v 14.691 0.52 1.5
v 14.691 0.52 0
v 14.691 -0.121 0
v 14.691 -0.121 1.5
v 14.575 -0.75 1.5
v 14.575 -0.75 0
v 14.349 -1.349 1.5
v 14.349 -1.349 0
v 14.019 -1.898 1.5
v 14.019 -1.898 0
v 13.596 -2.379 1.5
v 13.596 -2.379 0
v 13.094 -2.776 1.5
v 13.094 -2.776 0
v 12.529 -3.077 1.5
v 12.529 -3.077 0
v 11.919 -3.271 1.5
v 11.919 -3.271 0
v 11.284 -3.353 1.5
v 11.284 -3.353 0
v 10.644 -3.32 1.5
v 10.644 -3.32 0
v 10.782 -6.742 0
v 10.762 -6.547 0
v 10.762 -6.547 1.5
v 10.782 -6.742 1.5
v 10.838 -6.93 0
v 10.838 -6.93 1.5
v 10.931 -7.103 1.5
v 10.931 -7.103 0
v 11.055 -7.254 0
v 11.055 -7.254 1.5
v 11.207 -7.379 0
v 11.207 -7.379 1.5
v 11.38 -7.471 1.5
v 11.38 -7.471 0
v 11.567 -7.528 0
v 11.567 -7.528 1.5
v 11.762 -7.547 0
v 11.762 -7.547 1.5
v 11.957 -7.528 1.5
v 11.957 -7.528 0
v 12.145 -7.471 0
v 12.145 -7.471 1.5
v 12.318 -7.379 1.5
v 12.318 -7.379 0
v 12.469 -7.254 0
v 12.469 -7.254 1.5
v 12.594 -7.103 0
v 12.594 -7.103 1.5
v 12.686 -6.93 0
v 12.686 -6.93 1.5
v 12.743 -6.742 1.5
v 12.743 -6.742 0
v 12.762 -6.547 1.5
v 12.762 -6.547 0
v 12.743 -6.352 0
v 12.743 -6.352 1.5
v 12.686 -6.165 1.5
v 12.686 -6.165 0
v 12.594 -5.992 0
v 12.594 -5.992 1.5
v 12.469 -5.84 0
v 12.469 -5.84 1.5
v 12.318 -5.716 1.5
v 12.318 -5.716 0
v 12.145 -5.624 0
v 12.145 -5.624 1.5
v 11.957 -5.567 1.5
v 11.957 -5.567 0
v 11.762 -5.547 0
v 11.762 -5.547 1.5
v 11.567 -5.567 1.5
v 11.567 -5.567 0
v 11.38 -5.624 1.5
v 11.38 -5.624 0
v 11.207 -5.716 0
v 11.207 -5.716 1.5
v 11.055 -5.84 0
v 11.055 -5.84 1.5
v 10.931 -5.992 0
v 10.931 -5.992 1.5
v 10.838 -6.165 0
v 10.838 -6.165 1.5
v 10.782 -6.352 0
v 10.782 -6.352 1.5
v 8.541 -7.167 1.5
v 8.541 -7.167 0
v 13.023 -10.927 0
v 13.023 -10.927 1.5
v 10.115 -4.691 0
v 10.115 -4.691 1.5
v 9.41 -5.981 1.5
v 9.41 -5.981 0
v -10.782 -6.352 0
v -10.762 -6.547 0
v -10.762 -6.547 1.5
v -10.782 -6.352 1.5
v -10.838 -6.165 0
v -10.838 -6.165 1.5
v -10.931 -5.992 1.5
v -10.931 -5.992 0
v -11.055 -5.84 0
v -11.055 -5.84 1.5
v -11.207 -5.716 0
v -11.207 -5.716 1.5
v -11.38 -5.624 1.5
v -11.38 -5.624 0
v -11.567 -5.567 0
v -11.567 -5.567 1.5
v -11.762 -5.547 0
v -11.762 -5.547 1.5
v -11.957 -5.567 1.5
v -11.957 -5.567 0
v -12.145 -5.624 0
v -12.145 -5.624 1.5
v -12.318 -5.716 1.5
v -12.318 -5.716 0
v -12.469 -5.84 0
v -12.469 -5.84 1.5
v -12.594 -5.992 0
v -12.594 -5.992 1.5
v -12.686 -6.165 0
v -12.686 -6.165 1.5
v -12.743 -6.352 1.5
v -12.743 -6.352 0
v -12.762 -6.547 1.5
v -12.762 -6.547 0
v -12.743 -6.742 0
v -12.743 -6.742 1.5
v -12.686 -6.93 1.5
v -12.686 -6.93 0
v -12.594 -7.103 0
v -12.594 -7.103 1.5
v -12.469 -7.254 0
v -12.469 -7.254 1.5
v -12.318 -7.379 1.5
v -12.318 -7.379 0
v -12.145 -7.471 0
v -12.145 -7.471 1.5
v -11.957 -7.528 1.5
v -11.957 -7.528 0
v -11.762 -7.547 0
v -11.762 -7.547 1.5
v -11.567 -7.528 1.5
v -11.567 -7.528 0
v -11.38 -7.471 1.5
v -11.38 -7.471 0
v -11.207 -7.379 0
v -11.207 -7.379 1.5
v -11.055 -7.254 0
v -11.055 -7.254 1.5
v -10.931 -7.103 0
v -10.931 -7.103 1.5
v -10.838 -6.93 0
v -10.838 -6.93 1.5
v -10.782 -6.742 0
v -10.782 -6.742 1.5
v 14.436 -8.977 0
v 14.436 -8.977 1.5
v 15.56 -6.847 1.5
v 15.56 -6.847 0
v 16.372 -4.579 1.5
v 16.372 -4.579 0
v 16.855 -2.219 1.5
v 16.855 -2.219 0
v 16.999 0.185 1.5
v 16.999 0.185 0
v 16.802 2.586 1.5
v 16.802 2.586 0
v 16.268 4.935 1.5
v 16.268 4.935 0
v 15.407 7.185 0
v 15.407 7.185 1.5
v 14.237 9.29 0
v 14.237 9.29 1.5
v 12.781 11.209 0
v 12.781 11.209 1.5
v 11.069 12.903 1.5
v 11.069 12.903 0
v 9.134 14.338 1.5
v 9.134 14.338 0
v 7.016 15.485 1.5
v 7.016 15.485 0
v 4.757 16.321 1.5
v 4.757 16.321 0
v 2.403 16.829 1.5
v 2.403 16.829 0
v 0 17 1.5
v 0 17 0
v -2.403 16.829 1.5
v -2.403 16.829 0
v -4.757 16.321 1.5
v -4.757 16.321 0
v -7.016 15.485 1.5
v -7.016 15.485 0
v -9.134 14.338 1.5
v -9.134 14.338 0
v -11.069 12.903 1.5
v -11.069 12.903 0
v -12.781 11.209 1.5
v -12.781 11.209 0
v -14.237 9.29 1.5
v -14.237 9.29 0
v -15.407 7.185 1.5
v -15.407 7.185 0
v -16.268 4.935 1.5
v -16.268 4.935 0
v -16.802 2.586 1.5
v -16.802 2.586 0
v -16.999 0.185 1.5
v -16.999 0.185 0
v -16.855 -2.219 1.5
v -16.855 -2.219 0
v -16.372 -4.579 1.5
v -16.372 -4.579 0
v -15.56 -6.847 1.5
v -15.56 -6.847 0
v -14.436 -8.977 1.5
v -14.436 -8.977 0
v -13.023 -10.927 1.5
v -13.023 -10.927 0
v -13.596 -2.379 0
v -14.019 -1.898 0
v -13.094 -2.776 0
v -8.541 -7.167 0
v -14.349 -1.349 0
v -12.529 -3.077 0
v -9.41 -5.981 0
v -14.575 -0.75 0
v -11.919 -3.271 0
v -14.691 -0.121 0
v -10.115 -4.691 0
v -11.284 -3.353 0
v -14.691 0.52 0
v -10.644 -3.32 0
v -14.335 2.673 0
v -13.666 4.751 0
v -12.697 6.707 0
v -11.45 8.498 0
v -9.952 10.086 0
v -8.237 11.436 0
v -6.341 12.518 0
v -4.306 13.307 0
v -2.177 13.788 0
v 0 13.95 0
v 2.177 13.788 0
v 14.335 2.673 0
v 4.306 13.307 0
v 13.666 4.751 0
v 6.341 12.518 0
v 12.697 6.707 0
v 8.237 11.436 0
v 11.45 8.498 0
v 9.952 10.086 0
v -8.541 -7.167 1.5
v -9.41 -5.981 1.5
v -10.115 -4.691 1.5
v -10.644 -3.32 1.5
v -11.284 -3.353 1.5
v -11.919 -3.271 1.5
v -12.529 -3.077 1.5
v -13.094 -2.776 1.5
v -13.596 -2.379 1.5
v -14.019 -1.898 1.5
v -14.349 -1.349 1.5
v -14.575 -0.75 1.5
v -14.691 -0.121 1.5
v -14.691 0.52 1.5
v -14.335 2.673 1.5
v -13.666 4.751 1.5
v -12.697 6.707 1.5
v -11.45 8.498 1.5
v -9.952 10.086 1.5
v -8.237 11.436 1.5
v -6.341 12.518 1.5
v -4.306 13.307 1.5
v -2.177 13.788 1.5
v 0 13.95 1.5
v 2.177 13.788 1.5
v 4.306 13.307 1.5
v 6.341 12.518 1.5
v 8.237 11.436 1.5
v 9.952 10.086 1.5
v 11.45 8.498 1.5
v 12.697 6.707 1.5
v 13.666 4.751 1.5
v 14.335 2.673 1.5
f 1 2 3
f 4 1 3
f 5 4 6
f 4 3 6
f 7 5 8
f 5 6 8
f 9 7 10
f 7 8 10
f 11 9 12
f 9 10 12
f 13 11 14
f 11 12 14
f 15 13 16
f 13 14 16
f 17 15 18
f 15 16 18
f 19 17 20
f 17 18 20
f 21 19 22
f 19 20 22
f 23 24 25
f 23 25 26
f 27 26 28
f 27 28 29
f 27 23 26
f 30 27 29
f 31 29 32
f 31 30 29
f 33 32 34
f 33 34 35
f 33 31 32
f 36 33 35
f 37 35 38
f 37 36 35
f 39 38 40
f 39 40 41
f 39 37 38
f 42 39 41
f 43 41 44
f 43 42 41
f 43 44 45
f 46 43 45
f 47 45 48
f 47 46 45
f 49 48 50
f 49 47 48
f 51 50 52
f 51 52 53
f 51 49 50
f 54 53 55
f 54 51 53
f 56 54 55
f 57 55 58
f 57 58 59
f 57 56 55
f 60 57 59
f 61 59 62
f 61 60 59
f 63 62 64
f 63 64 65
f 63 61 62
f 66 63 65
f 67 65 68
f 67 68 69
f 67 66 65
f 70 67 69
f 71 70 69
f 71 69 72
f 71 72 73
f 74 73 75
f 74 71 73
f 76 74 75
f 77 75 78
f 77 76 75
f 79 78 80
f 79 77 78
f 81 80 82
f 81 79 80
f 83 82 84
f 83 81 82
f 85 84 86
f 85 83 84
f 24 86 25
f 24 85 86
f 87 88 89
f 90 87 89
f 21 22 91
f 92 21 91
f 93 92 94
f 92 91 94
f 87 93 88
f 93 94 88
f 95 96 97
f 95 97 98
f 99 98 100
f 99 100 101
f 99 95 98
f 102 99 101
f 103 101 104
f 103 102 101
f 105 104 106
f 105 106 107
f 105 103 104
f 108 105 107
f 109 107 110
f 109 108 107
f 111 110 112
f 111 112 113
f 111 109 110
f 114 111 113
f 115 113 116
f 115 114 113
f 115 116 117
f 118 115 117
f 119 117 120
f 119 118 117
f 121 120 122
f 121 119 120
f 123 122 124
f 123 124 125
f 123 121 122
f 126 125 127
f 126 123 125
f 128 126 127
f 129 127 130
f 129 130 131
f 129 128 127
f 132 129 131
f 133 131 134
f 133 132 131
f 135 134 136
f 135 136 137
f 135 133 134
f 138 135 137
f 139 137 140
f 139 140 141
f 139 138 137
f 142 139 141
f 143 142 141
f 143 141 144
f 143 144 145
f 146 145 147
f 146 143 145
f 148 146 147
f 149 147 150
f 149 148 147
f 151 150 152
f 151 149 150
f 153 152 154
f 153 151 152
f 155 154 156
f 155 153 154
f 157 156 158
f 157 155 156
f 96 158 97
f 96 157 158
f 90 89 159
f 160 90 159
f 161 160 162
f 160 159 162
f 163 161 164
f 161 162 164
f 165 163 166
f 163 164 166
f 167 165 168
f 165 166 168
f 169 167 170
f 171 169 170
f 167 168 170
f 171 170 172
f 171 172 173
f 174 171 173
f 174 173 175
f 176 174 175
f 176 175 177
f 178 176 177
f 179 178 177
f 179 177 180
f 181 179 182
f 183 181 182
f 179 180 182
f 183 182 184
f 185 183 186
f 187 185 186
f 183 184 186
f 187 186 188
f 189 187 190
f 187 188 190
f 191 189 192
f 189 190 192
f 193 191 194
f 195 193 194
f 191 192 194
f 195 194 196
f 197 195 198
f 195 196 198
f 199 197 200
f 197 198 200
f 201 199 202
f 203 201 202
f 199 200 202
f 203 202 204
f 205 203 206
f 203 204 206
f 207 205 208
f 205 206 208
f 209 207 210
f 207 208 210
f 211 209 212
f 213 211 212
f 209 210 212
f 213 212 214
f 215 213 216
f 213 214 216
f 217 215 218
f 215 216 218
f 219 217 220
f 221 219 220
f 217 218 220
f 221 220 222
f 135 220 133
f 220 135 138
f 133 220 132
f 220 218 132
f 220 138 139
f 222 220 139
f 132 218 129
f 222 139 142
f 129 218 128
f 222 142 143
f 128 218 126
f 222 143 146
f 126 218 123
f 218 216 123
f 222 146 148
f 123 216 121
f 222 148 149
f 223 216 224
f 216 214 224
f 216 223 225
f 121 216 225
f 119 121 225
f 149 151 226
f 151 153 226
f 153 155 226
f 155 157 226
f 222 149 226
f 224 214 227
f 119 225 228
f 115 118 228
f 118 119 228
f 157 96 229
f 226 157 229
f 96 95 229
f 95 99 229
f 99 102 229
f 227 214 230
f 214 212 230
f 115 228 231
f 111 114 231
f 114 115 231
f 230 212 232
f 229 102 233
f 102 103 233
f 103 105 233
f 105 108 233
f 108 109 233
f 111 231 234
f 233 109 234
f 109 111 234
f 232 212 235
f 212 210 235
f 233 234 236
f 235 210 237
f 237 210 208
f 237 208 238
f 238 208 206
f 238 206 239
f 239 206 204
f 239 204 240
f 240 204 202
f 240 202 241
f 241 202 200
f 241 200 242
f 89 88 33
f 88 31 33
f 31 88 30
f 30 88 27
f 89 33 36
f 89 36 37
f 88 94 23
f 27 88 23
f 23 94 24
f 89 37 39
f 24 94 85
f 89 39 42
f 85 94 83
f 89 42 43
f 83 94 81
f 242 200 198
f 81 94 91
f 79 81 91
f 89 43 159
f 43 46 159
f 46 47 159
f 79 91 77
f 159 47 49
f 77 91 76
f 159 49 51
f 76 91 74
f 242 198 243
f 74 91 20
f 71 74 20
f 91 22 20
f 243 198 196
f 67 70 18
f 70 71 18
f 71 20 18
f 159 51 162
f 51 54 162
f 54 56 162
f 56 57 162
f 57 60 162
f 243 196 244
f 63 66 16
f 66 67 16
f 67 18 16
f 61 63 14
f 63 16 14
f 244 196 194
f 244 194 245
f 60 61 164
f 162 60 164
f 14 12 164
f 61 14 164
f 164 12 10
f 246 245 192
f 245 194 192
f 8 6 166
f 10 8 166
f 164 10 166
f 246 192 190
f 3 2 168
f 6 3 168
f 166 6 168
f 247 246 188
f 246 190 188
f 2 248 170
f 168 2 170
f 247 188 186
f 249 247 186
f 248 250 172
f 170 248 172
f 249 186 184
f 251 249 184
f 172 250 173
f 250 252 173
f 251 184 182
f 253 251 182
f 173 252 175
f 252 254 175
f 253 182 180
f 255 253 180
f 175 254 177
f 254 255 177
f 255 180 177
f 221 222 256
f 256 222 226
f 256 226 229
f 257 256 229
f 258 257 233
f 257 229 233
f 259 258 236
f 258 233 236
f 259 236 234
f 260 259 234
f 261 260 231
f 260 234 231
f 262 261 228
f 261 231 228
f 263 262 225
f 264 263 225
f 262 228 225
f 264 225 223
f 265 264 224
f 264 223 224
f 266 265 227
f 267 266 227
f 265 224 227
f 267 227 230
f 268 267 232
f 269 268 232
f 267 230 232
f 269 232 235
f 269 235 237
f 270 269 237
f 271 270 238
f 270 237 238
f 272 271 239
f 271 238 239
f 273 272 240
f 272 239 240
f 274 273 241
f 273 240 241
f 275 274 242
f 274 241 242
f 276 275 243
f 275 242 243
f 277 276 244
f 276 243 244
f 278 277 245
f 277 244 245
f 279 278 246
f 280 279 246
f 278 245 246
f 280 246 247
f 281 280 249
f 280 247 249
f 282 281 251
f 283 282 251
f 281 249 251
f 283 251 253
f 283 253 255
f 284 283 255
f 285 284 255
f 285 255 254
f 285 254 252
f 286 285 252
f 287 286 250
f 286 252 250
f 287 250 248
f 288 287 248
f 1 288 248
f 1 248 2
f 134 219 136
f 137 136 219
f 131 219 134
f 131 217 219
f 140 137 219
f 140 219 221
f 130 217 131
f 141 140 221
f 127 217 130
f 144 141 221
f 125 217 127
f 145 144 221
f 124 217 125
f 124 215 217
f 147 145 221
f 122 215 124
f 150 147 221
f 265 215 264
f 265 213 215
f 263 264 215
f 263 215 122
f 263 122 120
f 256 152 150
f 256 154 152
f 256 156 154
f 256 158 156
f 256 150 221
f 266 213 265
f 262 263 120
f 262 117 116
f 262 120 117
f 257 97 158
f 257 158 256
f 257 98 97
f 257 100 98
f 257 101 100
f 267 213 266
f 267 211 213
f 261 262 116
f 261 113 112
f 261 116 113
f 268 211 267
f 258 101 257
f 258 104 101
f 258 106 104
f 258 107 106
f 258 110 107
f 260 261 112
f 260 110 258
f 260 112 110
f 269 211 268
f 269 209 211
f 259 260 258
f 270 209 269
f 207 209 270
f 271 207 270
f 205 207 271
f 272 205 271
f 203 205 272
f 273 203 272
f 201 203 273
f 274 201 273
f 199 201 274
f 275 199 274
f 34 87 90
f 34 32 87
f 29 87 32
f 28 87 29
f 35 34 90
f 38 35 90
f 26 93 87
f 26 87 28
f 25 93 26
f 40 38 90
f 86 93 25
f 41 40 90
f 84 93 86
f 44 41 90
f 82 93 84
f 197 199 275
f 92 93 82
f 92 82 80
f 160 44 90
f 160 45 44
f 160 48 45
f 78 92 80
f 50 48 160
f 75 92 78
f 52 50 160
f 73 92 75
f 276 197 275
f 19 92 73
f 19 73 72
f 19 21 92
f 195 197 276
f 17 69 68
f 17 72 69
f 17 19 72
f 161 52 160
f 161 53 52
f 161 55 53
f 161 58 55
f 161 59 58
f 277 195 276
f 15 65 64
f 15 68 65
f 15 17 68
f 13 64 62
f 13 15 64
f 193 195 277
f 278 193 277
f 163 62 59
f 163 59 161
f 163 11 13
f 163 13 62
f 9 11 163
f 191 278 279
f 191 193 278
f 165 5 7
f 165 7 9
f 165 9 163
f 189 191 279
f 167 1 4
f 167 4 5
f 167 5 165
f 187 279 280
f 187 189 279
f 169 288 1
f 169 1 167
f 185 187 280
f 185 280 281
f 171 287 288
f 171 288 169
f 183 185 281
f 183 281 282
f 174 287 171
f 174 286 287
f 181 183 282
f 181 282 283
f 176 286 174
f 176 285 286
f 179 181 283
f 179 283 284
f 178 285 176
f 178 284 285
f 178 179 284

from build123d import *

# Parameters (mm, degrees)
SKETCH1_R           = 1
BOSS_EXTRUDE1_DEPTH = 1.5


with BuildPart() as part:
    # Sketch1 → Boss-Extrude1 (new body)
    with BuildSketch(Plane.XY):
        with BuildLine():
            Line((-13.022755533, -10.927389365), (-8.541395541, -7.167081848))
            ThreePointArc((-8.541395541, -7.167081848), (-9.783859128, -5.347765941), (-10.644354895, -3.319669993))
            ThreePointArc((-10.644354895, -3.319669993), (-13.596382147, -2.37892663), (-14.690850544, 0.51962506))
            ThreePointArc((-14.690850544, 0.51962506), (0, 13.95), (14.690850544, 0.51962506))
            ThreePointArc((14.690850544, 0.51962506), (13.596382147, -2.37892663), (10.644354895, -3.319669993))
            ThreePointArc((10.644354895, -3.319669993), (9.783859128, -5.347765941), (8.541395541, -7.167081848))
            Line((8.541395541, -7.167081848), (13.022755533, -10.927389365))
            ThreePointArc((13.022755533, -10.927389365), (0, 17), (-13.022755533, -10.927389365))
        make_face()
        with Locations((-11.762324169, -6.547389365)):
            Circle(SKETCH1_R, mode=Mode.SUBTRACT)
        with Locations(Location((11.762324169, -6.547389365, 0), (0, 0, 180))):
            Circle(SKETCH1_R, mode=Mode.SUBTRACT)
    extrude(amount=BOSS_EXTRUDE1_DEPTH)


solid = part.part
